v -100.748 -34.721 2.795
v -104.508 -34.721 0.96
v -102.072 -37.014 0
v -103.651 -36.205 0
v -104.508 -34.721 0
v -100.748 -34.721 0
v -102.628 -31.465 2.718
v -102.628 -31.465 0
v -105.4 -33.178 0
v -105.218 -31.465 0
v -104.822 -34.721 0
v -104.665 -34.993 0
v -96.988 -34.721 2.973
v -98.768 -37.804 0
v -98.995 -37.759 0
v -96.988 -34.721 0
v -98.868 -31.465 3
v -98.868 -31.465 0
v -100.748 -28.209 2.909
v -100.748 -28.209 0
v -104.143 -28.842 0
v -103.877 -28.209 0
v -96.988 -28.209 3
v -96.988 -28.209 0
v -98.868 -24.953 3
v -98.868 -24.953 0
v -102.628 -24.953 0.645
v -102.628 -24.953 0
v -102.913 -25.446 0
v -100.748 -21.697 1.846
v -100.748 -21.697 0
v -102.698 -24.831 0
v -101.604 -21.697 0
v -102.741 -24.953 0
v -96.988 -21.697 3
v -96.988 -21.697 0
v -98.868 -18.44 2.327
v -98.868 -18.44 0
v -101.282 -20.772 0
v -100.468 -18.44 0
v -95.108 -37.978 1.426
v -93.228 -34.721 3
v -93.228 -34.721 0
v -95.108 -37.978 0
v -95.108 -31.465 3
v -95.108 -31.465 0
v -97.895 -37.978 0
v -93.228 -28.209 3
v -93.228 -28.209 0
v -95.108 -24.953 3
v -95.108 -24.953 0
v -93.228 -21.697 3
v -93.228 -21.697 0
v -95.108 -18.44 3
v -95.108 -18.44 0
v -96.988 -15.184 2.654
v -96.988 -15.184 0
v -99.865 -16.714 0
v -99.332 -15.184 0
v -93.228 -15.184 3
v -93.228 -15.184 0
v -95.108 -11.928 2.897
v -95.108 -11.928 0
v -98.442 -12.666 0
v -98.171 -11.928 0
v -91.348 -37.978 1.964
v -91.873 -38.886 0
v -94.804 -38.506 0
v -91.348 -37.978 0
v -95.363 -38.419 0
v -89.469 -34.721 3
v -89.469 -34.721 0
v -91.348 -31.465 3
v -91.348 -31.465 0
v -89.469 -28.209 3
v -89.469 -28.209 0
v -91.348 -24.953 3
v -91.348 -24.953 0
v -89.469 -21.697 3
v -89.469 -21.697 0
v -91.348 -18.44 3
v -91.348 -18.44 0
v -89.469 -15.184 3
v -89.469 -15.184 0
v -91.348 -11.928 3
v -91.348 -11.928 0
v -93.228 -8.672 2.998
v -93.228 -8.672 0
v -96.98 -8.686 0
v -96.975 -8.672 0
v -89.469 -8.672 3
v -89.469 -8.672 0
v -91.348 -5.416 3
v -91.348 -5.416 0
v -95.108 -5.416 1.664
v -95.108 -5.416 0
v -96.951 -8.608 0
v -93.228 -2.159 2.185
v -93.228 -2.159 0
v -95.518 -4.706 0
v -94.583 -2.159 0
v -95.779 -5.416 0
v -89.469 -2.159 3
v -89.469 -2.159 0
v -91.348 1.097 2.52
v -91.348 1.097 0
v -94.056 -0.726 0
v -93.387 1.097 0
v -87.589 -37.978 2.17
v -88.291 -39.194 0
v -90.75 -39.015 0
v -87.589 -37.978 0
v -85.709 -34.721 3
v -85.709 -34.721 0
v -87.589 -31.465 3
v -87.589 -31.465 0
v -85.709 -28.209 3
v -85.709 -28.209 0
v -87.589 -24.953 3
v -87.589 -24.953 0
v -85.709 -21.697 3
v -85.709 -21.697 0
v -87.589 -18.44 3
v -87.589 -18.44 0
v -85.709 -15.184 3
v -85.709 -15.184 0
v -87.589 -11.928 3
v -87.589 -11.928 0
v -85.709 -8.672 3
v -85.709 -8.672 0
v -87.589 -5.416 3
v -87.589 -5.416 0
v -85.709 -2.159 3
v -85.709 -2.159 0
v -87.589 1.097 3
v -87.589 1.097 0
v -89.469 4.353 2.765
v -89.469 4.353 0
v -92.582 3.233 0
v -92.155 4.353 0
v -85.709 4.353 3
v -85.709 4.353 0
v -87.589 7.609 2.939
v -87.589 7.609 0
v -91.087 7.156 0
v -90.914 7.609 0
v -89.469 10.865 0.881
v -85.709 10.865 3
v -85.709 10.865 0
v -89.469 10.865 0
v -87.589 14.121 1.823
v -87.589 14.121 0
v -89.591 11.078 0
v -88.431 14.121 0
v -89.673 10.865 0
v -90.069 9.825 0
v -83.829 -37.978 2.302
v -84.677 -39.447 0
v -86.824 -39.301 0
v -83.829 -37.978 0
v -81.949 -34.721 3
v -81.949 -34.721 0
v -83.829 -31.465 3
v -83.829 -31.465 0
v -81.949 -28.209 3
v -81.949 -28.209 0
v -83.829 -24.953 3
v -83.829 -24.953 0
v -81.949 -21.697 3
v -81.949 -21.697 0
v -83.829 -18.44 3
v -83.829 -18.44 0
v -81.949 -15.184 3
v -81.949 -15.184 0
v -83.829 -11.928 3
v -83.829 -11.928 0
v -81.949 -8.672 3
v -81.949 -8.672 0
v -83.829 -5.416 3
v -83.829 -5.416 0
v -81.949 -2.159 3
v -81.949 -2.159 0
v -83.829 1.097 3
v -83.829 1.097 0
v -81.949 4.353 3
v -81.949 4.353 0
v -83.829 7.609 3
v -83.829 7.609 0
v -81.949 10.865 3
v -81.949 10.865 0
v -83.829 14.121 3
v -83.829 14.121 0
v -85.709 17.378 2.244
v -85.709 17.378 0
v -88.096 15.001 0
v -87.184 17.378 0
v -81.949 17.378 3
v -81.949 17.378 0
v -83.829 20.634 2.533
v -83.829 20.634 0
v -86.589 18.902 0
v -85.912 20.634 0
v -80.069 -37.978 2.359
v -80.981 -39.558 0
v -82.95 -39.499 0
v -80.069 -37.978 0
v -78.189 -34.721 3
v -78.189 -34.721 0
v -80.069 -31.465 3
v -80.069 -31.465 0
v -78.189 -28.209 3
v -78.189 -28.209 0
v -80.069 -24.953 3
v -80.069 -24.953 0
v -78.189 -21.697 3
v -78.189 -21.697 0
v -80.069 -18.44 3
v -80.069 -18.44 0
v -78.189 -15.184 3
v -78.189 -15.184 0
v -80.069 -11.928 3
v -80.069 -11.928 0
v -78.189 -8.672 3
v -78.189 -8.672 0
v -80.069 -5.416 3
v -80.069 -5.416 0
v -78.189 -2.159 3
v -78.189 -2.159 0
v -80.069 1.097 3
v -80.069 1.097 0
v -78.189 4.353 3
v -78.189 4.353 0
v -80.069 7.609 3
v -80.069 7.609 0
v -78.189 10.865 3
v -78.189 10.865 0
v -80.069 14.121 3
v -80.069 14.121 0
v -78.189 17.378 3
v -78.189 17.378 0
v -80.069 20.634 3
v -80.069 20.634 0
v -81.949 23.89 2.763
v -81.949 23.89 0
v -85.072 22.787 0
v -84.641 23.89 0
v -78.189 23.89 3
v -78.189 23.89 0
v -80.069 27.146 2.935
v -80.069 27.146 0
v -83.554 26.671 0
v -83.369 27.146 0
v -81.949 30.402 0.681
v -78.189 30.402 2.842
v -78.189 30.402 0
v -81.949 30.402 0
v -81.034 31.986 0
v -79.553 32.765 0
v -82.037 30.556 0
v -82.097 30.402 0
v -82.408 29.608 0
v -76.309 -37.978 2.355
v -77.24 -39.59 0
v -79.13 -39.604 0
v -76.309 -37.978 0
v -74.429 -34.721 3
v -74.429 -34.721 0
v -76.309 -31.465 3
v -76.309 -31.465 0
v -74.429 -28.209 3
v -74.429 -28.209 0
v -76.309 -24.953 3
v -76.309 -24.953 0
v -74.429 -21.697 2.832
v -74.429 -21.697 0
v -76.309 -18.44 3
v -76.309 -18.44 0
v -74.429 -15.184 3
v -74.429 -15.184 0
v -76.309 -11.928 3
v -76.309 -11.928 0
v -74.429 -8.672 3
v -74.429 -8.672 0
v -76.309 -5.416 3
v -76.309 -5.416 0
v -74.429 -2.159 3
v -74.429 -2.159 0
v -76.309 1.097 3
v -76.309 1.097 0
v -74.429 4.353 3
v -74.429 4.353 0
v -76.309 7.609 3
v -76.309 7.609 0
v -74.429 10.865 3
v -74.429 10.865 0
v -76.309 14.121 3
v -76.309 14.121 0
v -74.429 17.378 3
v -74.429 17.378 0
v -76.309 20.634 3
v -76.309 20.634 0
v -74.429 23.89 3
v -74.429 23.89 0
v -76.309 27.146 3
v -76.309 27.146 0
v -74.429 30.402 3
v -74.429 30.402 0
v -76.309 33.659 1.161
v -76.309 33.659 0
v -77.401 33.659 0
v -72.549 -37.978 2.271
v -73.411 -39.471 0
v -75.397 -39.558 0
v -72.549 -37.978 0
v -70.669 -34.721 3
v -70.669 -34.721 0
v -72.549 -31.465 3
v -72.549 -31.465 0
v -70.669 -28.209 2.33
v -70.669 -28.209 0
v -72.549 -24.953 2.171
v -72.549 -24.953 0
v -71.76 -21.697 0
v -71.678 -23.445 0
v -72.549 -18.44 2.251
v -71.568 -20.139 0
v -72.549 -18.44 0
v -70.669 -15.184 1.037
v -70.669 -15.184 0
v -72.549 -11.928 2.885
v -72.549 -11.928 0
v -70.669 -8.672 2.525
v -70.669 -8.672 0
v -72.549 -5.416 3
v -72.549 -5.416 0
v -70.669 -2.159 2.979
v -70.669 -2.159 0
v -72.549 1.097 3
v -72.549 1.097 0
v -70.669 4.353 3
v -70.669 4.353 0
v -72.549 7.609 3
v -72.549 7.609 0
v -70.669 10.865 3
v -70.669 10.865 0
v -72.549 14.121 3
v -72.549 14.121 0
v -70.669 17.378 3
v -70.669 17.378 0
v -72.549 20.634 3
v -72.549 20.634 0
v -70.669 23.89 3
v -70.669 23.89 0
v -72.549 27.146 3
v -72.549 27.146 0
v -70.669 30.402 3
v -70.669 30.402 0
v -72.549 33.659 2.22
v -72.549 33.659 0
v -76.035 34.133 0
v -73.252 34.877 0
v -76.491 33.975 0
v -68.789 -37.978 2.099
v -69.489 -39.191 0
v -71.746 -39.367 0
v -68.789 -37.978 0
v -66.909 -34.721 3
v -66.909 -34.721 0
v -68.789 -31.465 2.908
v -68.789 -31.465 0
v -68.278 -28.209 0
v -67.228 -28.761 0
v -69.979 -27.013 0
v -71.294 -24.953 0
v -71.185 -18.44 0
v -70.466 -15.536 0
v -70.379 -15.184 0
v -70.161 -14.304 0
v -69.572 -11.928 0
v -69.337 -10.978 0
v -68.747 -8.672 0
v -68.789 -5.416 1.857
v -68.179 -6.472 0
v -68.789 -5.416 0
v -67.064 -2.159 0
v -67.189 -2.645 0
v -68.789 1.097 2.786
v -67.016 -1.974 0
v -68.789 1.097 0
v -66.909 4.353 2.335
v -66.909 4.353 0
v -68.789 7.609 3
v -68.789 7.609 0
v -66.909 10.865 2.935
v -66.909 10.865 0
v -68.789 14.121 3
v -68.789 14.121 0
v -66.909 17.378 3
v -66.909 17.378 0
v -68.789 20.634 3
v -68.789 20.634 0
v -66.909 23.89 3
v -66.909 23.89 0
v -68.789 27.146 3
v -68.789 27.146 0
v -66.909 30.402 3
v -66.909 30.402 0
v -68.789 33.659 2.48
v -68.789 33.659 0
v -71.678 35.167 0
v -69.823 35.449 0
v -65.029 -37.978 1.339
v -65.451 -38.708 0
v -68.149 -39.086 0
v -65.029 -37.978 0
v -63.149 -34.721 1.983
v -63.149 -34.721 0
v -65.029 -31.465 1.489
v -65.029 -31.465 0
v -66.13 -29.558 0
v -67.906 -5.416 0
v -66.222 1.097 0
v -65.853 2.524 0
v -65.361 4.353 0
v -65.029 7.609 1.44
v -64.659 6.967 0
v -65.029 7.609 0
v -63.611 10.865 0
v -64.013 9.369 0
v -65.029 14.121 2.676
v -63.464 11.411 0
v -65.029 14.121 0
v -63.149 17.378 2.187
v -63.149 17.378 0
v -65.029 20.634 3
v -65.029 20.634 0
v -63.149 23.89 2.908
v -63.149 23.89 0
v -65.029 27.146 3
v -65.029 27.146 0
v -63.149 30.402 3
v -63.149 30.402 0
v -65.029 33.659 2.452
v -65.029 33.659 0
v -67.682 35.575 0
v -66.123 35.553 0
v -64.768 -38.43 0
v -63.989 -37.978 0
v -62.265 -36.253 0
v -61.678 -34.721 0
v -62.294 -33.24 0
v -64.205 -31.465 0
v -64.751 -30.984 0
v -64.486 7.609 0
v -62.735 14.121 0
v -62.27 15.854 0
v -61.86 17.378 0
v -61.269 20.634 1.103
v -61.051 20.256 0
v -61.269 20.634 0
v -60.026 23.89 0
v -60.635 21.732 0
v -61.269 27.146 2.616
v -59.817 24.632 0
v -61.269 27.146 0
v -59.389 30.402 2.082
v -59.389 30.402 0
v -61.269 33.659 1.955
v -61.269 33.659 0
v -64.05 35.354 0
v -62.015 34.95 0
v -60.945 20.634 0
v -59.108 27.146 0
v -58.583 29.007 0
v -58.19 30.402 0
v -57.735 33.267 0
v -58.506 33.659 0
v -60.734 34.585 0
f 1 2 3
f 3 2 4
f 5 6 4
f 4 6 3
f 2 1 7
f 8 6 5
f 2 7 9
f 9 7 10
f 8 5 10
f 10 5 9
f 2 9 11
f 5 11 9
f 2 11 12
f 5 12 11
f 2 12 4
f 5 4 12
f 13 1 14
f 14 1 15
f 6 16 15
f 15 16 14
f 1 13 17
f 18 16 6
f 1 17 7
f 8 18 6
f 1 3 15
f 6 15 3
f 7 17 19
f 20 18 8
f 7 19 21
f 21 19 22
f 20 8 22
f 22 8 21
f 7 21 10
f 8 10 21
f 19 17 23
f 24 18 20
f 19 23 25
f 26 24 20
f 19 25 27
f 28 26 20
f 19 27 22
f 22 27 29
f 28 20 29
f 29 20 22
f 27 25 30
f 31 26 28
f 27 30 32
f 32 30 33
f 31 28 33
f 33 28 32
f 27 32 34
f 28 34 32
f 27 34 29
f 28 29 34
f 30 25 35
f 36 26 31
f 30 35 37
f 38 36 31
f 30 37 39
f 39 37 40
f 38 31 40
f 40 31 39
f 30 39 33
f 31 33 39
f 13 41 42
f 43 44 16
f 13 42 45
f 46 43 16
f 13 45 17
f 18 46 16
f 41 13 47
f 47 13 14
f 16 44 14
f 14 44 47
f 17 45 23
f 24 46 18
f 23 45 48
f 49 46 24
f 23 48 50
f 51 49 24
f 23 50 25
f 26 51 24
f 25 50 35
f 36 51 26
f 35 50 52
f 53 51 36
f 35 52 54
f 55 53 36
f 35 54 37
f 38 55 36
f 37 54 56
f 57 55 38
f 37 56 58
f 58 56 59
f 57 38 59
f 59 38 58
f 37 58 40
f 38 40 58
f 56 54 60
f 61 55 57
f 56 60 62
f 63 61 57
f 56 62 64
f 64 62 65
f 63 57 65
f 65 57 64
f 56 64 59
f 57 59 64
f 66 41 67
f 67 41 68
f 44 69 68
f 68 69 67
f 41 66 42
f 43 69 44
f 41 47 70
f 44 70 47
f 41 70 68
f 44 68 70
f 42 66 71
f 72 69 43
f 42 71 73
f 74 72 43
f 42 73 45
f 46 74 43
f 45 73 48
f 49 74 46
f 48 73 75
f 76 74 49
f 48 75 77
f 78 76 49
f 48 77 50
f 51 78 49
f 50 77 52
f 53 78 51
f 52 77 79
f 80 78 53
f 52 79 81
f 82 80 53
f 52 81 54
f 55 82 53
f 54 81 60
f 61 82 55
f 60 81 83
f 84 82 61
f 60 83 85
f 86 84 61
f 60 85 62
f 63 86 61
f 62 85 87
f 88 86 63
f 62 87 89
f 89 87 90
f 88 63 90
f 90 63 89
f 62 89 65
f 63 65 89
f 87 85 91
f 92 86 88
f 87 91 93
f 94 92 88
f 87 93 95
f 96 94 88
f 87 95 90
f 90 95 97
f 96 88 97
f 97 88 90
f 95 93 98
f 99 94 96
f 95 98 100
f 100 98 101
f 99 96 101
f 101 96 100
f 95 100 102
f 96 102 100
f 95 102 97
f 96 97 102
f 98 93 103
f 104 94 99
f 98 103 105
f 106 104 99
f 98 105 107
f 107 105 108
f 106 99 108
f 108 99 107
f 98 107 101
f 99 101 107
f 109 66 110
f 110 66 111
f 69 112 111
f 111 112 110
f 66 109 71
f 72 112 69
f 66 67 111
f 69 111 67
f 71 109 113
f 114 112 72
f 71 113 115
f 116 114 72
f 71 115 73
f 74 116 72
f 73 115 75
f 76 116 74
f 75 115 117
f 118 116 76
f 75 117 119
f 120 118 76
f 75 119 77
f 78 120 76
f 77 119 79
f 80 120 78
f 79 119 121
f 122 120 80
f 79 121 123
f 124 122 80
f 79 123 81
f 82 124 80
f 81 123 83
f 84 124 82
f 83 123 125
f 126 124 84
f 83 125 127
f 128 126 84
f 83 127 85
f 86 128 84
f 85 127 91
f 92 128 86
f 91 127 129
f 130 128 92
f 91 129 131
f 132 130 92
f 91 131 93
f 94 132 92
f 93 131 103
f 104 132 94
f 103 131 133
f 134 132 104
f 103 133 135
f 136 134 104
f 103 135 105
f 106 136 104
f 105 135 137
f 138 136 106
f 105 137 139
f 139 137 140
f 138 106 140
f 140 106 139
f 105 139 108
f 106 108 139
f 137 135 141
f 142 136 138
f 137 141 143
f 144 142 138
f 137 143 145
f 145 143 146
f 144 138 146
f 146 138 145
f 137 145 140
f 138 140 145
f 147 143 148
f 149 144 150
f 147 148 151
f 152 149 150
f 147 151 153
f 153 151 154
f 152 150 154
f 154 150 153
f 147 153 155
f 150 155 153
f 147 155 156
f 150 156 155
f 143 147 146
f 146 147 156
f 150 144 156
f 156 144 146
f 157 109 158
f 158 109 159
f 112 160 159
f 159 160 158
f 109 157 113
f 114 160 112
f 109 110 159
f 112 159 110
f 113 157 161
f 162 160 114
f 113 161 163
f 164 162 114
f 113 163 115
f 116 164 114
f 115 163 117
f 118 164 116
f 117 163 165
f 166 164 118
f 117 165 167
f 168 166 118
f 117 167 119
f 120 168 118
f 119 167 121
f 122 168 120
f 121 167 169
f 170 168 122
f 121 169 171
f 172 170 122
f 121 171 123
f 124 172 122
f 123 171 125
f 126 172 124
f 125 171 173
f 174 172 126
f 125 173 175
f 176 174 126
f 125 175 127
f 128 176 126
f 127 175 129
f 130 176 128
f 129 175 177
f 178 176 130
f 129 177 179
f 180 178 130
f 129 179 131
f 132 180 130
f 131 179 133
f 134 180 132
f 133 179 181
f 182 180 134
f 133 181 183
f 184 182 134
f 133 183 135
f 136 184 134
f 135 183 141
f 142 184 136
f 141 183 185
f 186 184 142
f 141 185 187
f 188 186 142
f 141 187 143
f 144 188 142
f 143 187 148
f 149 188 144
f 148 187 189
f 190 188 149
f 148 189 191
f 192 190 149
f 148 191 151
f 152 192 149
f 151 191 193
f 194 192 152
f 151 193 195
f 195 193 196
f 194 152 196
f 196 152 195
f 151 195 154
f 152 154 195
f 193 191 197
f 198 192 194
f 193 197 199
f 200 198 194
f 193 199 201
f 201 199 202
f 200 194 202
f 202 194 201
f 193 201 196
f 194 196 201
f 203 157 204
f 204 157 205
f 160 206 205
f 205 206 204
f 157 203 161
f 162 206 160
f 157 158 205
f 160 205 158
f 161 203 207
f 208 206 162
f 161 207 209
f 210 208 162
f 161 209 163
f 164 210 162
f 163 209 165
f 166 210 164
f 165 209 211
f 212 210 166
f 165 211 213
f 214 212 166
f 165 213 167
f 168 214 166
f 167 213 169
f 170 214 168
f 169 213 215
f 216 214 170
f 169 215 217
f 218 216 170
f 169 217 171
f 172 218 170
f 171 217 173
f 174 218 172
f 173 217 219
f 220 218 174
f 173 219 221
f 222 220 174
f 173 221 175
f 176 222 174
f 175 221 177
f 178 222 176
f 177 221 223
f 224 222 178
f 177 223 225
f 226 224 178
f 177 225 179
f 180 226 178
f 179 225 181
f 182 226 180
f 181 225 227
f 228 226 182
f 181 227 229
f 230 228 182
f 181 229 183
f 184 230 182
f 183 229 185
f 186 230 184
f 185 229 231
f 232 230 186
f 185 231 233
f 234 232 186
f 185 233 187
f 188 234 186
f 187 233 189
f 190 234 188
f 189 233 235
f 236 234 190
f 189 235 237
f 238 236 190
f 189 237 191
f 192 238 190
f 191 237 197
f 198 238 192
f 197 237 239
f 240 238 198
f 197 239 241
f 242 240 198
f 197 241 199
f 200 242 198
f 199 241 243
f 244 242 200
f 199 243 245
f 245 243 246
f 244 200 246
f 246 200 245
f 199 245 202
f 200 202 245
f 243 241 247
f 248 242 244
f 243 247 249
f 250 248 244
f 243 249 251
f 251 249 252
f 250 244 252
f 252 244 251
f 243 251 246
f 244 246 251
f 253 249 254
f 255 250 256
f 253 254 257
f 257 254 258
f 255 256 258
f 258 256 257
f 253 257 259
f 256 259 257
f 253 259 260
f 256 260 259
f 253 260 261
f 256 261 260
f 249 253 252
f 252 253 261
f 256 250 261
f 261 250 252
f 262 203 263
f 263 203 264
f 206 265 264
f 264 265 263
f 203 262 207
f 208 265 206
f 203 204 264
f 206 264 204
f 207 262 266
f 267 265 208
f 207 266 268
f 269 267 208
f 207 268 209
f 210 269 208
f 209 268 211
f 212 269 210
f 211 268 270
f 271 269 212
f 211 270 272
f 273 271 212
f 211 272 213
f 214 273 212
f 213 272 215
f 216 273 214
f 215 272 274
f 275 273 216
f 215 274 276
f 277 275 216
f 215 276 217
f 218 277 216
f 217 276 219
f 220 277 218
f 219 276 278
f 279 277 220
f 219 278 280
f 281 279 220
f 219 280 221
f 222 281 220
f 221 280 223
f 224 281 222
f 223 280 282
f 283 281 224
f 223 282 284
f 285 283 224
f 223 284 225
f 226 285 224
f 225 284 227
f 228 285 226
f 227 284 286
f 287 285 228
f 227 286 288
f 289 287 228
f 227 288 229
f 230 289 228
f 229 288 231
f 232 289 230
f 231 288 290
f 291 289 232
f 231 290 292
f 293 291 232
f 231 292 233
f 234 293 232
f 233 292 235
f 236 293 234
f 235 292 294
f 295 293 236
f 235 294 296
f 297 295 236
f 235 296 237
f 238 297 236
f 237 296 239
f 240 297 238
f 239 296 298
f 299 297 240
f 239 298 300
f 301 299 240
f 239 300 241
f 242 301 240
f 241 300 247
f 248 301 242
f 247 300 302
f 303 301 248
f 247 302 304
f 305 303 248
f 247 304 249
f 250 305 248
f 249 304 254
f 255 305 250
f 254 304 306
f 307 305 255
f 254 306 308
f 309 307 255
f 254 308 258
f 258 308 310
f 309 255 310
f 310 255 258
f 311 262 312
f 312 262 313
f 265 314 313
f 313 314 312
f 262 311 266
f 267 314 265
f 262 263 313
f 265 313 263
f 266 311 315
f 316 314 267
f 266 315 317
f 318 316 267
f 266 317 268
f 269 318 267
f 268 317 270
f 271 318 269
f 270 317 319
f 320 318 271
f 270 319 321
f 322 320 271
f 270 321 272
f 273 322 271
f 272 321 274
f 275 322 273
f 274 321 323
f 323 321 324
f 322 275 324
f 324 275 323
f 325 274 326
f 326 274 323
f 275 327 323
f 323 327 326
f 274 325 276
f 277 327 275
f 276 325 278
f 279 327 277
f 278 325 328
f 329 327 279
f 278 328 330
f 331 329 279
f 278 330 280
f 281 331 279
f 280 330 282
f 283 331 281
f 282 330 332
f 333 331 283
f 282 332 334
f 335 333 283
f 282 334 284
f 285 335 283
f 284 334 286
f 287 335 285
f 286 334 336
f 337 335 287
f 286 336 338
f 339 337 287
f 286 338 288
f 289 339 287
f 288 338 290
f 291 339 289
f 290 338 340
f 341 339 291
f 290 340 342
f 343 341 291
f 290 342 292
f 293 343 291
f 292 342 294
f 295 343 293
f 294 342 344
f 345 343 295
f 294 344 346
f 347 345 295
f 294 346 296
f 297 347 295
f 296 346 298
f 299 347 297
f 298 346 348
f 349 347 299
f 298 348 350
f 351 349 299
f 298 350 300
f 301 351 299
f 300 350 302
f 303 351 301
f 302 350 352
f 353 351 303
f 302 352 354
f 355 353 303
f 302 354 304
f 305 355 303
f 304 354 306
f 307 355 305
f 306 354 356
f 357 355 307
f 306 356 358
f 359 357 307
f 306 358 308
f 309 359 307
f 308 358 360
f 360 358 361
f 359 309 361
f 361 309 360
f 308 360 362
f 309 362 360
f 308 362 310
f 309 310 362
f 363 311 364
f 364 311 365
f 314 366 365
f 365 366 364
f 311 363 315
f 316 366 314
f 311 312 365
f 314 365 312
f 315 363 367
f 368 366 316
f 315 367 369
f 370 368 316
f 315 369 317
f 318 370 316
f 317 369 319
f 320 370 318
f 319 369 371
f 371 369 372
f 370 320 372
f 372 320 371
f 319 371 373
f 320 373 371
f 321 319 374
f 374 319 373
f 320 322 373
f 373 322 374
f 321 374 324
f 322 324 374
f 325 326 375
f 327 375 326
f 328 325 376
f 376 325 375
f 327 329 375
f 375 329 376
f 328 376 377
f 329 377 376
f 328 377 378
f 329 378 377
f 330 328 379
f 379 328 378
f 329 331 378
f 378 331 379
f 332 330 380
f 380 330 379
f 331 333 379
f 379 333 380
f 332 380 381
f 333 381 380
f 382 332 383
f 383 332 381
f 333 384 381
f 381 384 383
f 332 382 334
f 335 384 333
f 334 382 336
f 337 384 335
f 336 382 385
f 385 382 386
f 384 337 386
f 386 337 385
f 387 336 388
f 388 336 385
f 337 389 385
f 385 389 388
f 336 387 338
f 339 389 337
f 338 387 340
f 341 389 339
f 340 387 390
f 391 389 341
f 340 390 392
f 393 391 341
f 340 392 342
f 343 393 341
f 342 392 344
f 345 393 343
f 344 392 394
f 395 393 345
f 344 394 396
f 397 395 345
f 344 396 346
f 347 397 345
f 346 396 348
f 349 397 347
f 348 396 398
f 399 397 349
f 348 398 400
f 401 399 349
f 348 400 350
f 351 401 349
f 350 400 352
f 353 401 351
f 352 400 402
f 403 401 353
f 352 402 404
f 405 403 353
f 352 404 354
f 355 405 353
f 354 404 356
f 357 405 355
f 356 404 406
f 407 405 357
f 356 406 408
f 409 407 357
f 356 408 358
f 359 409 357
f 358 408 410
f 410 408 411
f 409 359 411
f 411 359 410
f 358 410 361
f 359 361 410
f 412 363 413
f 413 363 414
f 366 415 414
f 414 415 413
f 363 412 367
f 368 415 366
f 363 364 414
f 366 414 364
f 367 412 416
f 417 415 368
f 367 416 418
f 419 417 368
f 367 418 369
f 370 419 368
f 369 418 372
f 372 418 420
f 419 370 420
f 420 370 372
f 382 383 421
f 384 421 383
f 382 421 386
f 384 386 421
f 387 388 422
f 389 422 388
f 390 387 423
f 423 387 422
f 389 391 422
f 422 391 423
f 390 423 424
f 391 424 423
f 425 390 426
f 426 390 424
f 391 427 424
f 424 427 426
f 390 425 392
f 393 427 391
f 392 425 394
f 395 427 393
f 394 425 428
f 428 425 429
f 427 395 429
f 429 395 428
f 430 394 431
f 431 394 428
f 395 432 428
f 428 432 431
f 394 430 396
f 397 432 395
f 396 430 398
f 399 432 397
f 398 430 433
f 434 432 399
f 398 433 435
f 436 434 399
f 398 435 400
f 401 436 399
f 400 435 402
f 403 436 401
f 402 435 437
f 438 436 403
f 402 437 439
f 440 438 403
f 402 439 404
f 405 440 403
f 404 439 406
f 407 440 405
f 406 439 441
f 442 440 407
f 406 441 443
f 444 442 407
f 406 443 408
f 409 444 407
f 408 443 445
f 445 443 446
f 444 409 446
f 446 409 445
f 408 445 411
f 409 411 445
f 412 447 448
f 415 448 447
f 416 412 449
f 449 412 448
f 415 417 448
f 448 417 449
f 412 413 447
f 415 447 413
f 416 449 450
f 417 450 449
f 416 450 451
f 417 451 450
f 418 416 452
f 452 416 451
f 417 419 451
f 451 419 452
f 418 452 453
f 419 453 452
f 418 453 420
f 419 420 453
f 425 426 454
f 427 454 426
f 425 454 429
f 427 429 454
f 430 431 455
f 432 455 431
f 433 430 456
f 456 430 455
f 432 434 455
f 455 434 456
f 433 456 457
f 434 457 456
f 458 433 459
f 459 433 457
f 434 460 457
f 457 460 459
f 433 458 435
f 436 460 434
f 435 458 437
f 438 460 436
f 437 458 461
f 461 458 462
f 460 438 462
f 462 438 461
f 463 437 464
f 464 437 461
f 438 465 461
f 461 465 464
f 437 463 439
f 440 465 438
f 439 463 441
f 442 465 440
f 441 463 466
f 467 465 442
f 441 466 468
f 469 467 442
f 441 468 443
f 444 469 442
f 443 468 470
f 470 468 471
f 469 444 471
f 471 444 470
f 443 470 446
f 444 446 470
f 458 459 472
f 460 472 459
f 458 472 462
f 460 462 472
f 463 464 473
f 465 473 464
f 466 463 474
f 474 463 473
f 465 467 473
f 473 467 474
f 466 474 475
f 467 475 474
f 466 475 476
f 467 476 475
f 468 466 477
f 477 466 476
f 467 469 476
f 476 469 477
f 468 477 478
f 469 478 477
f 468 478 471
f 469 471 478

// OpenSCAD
center_inflated_handlenset_2 = [-81.56742,-2.01432];
size_inflated_handlenset_2 = [47.66421,75.17897];
color_inflated_handlenset_2 = [1.00000,1.00000,0.00000];

module inflated_handlenset_2() {
  color(color_inflated_handlenset_2) polyhedron(points=[[-20.50435,-34.99940,0.00000],[-22.94080,-32.70708,0.95978],[-19.18088,-32.70708,2.79533],[-22.08396,-34.19117,0.00000],[-19.18088,-32.70708,-0.00000],[-22.94080,-32.70708,-0.00000],[-21.06084,-29.45089,2.71815],[-21.06084,-29.45089,-0.00000],[-23.83210,-31.16330,0.00000],[-23.65095,-29.45089,0.00000],[-23.25449,-32.70708,0.00000],[-23.09790,-32.97917,0.00000],[-17.20067,-35.78964,0.00000],[-15.42095,-32.70708,2.97272],[-17.42718,-35.74458,0.00000],[-15.42095,-32.70708,-0.00000],[-17.30092,-29.45089,3.00000],[-17.30092,-29.45089,-0.00000],[-19.18088,-26.19470,2.90929],[-19.18088,-26.19470,-0.00000],[-22.57530,-26.82777,0.00000],[-22.30999,-26.19470,0.00000],[-15.42095,-26.19470,3.00000],[-15.42095,-26.19470,-0.00000],[-17.30092,-22.93851,3.00000],[-17.30092,-22.93851,-0.00000],[-21.06084,-22.93851,0.64451],[-21.06084,-22.93851,-0.00000],[-21.34574,-23.43197,0.00000],[-19.18088,-19.68231,1.84604],[-19.18088,-19.68231,-0.00000],[-21.13106,-22.81688,0.00000],[-20.03704,-19.68231,0.00000],[-21.17352,-22.93851,0.00000],[-15.42095,-19.68231,3.00000],[-15.42095,-19.68231,-0.00000],[-17.30092,-16.42612,2.32710],[-17.30092,-16.42612,-0.00000],[-19.71448,-18.75810,0.00000],[-18.90057,-16.42612,0.00000],[-11.66103,-32.70708,3.00000],[-13.54099,-35.96327,1.42557],[-13.54099,-35.96327,-0.00000],[-11.66103,-32.70708,-0.00000],[-13.54099,-29.45089,3.00000],[-13.54099,-29.45089,-0.00000],[-16.32773,-35.96327,0.00000],[-11.66103,-26.19470,3.00000],[-11.66103,-26.19470,-0.00000],[-13.54099,-22.93851,3.00000],[-13.54099,-22.93851,-0.00000],[-11.66103,-19.68231,3.00000],[-11.66103,-19.68231,-0.00000],[-13.54099,-16.42612,3.00000],[-13.54099,-16.42612,-0.00000],[-15.42095,-13.16993,2.65351],[-15.42095,-13.16993,-0.00000],[-18.29789,-14.69932,0.00000],[-17.76410,-13.16993,0.00000],[-11.66103,-13.16993,3.00000],[-11.66103,-13.16993,-0.00000],[-13.54099,-9.91374,2.89666],[-13.54099,-9.91374,-0.00000],[-16.87473,-10.65192,0.00000],[-16.60357,-9.91374,0.00000],[-10.30547,-36.87156,0.00000],[-9.78106,-35.96327,1.96432],[-13.23616,-36.49125,0.00000],[-9.78106,-35.96327,-0.00000],[-13.79606,-36.40506,0.00000],[-7.90110,-32.70708,3.00000],[-7.90110,-32.70708,-0.00000],[-9.78106,-29.45089,3.00000],[-9.78106,-29.45089,-0.00000],[-7.90110,-26.19470,3.00000],[-7.90110,-26.19470,-0.00000],[-9.78106,-22.93851,3.00000],[-9.78106,-22.93851,-0.00000],[-7.90110,-19.68231,3.00000],[-7.90110,-19.68231,-0.00000],[-9.78106,-16.42612,3.00000],[-9.78106,-16.42612,-0.00000],[-7.90110,-13.16993,3.00000],[-7.90110,-13.16993,-0.00000],[-9.78106,-9.91374,3.00000],[-9.78106,-9.91374,-0.00000],[-11.66103,-6.65755,2.99821],[-11.66103,-6.65755,-0.00000],[-15.41272,-6.67181,0.00000],[-15.40748,-6.65755,0.00000],[-7.90110,-6.65755,3.00000],[-7.90110,-6.65755,-0.00000],[-9.78106,-3.40136,3.00000],[-9.78106,-3.40136,-0.00000],[-13.54099,-3.40136,1.66450],[-13.54099,-3.40136,-0.00000],[-15.38393,-6.59342,0.00000],[-11.66103,-0.14517,2.18521],[-11.66103,-0.14517,-0.00000],[-13.95071,-2.69169,0.00000],[-13.01530,-0.14517,0.00000],[-14.21139,-3.40136,0.00000],[-7.90110,-0.14517,3.00000],[-7.90110,-0.14517,-0.00000],[-9.78106,3.11102,2.51968],[-9.78106,3.11102,-0.00000],[-12.48871,1.28842,0.00000],[-11.81921,3.11102,0.00000],[-6.72352,-37.17983,0.00000],[-6.02114,-35.96327,2.16988],[-9.18211,-37.00069,0.00000],[-6.02114,-35.96327,-0.00000],[-4.14118,-32.70708,3.00000],[-4.14118,-32.70708,-0.00000],[-6.02114,-29.45089,3.00000],[-6.02114,-29.45089,-0.00000],[-4.14118,-26.19470,3.00000],[-4.14118,-26.19470,-0.00000],[-6.02114,-22.93851,3.00000],[-6.02114,-22.93851,-0.00000],[-4.14118,-19.68231,3.00000],[-4.14118,-19.68231,-0.00000],[-6.02114,-16.42612,3.00000],[-6.02114,-16.42612,-0.00000],[-4.14118,-13.16993,3.00000],[-4.14118,-13.16993,-0.00000],[-6.02114,-9.91374,3.00000],[-6.02114,-9.91374,-0.00000],[-4.14118,-6.65755,3.00000],[-4.14118,-6.65755,-0.00000],[-6.02114,-3.40136,3.00000],[-6.02114,-3.40136,-0.00000],[-4.14118,-0.14517,3.00000],[-4.14118,-0.14517,-0.00000],[-6.02114,3.11102,3.00000],[-6.02114,3.11102,-0.00000],[-7.90110,6.36722,2.76541],[-7.90110,6.36722,-0.00000],[-11.01454,5.24746,0.00000],[-10.58768,6.36722,0.00000],[-4.14118,6.36722,3.00000],[-4.14118,6.36722,-0.00000],[-6.02114,9.62341,2.93912],[-6.02114,9.62341,-0.00000],[-9.51927,9.16996,0.00000],[-9.34642,9.62341,0.00000],[-4.14118,12.87960,3.00000],[-7.90110,12.87960,0.88127],[-7.90110,12.87960,-0.00000],[-4.14118,12.87960,-0.00000],[-6.02114,16.13579,1.82341],[-6.02114,16.13579,-0.00000],[-8.02400,13.09247,0.00000],[-6.86388,16.13579,0.00000],[-8.10515,12.87960,0.00000],[-8.50170,11.83933,0.00000],[-3.10967,-37.43284,0.00000],[-2.26121,-35.96327,2.30165],[-5.25706,-37.28669,0.00000],[-2.26121,-35.96327,-0.00000],[-0.38125,-32.70708,3.00000],[-0.38125,-32.70708,-0.00000],[-2.26121,-29.45089,3.00000],[-2.26121,-29.45089,-0.00000],[-0.38125,-26.19470,3.00000],[-0.38125,-26.19470,-0.00000],[-2.26121,-22.93851,3.00000],[-2.26121,-22.93851,-0.00000],[-0.38125,-19.68231,3.00000],[-0.38125,-19.68231,-0.00000],[-2.26121,-16.42612,3.00000],[-2.26121,-16.42612,-0.00000],[-0.38125,-13.16993,3.00000],[-0.38125,-13.16993,-0.00000],[-2.26121,-9.91374,3.00000],[-2.26121,-9.91374,-0.00000],[-0.38125,-6.65755,3.00000],[-0.38125,-6.65755,-0.00000],[-2.26121,-3.40136,3.00000],[-2.26121,-3.40136,-0.00000],[-0.38125,-0.14517,3.00000],[-0.38125,-0.14517,-0.00000],[-2.26121,3.11102,3.00000],[-2.26121,3.11102,-0.00000],[-0.38125,6.36722,3.00000],[-0.38125,6.36722,-0.00000],[-2.26121,9.62341,3.00000],[-2.26121,9.62341,-0.00000],[-0.38125,12.87960,3.00000],[-0.38125,12.87960,-0.00000],[-2.26121,16.13579,3.00000],[-2.26121,16.13579,-0.00000],[-4.14118,19.39198,2.24447],[-4.14118,19.39198,-0.00000],[-6.52873,17.01497,0.00000],[-5.61682,19.39198,0.00000],[-0.38125,19.39198,3.00000],[-0.38125,19.39198,-0.00000],[-2.26121,22.64817,2.53282],[-2.26121,22.64817,-0.00000],[-5.02137,20.91653,0.00000],[-4.34505,22.64817,0.00000],[0.58622,-37.54375,0.00000],[1.49871,-35.96327,2.35889],[-1.38284,-37.48466,0.00000],[1.49871,-35.96327,-0.00000],[3.37868,-32.70708,3.00000],[3.37868,-32.70708,-0.00000],[1.49871,-29.45089,3.00000],[1.49871,-29.45089,-0.00000],[3.37868,-26.19470,3.00000],[3.37868,-26.19470,-0.00000],[1.49871,-22.93851,3.00000],[1.49871,-22.93851,-0.00000],[3.37868,-19.68231,3.00000],[3.37868,-19.68231,-0.00000],[1.49871,-16.42612,3.00000],[1.49871,-16.42612,-0.00000],[3.37868,-13.16993,3.00000],[3.37868,-13.16993,-0.00000],[1.49871,-9.91374,3.00000],[1.49871,-9.91374,-0.00000],[3.37868,-6.65755,3.00000],[3.37868,-6.65755,-0.00000],[1.49871,-3.40136,3.00000],[1.49871,-3.40136,-0.00000],[3.37868,-0.14517,3.00000],[3.37868,-0.14517,-0.00000],[1.49871,3.11102,3.00000],[1.49871,3.11102,-0.00000],[3.37868,6.36722,3.00000],[3.37868,6.36722,-0.00000],[1.49871,9.62341,3.00000],[1.49871,9.62341,-0.00000],[3.37868,12.87960,3.00000],[3.37868,12.87960,-0.00000],[1.49871,16.13579,3.00000],[1.49871,16.13579,-0.00000],[3.37868,19.39198,3.00000],[3.37868,19.39198,-0.00000],[1.49871,22.64817,3.00000],[1.49871,22.64817,-0.00000],[-0.38125,25.90436,2.76283],[-0.38125,25.90436,-0.00000],[-3.50419,24.80107,0.00000],[-3.07327,25.90436,0.00000],[3.37868,25.90436,3.00000],[3.37868,25.90436,-0.00000],[1.49871,29.16055,2.93540],[1.49871,29.16055,-0.00000],[-1.98700,28.68560,0.00000],[-1.80150,29.16055,0.00000],[3.37868,32.41675,2.84242],[-0.38125,32.41675,0.68079],[-0.38125,32.41675,-0.00000],[3.37868,32.41675,-0.00000],[0.53304,34.00033,0.00000],[2.01450,34.77957,0.00000],[-0.46981,32.57014,0.00000],[-0.52972,32.41675,0.00000],[-0.84020,31.62182,0.00000],[4.32750,-37.57605,0.00000],[5.25864,-35.96327,2.35535],[2.43761,-37.58948,0.00000],[5.25864,-35.96327,-0.00000],[7.13860,-32.70708,3.00000],[7.13860,-32.70708,-0.00000],[5.25864,-29.45089,3.00000],[5.25864,-29.45089,-0.00000],[7.13860,-26.19470,3.00000],[7.13860,-26.19470,-0.00000],[5.25864,-22.93851,3.00000],[5.25864,-22.93851,-0.00000],[7.13860,-19.68231,2.83164],[7.13860,-19.68231,-0.00000],[5.25864,-16.42612,3.00000],[5.25864,-16.42612,-0.00000],[7.13860,-13.16993,3.00000],[7.13860,-13.16993,-0.00000],[5.25864,-9.91374,3.00000],[5.25864,-9.91374,-0.00000],[7.13860,-6.65755,3.00000],[7.13860,-6.65755,-0.00000],[5.25864,-3.40136,3.00000],[5.25864,-3.40136,-0.00000],[7.13860,-0.14517,3.00000],[7.13860,-0.14517,-0.00000],[5.25864,3.11102,3.00000],[5.25864,3.11102,-0.00000],[7.13860,6.36722,3.00000],[7.13860,6.36722,-0.00000],[5.25864,9.62341,3.00000],[5.25864,9.62341,-0.00000],[7.13860,12.87960,3.00000],[7.13860,12.87960,-0.00000],[5.25864,16.13579,3.00000],[5.25864,16.13579,-0.00000],[7.13860,19.39198,3.00000],[7.13860,19.39198,-0.00000],[5.25864,22.64817,3.00000],[5.25864,22.64817,-0.00000],[7.13860,25.90436,3.00000],[7.13860,25.90436,-0.00000],[5.25864,29.16055,3.00000],[5.25864,29.16055,-0.00000],[7.13860,32.41675,3.00000],[7.13860,32.41675,-0.00000],[5.25864,35.67294,1.16078],[5.25864,35.67294,-0.00000],[4.16627,35.67294,0.00000],[8.15630,-37.45676,0.00000],[9.01856,-35.96327,2.27131],[6.17085,-37.54327,0.00000],[9.01856,-35.96327,-0.00000],[10.89853,-32.70708,3.00000],[10.89853,-32.70708,-0.00000],[9.01856,-29.45089,3.00000],[9.01856,-29.45089,-0.00000],[10.89853,-26.19470,2.32976],[10.89853,-26.19470,-0.00000],[9.01856,-22.93851,2.17150],[9.01856,-22.93851,-0.00000],[9.80724,-19.68231,0.00000],[9.88919,-21.43053,0.00000],[9.99934,-18.12488,0.00000],[9.01856,-16.42612,2.25132],[9.01856,-16.42612,-0.00000],[10.89853,-13.16993,1.03721],[10.89853,-13.16993,-0.00000],[9.01856,-9.91374,2.88484],[9.01856,-9.91374,-0.00000],[10.89853,-6.65755,2.52485],[10.89853,-6.65755,-0.00000],[9.01856,-3.40136,3.00000],[9.01856,-3.40136,-0.00000],[10.89853,-0.14517,2.97906],[10.89853,-0.14517,-0.00000],[9.01856,3.11102,3.00000],[9.01856,3.11102,-0.00000],[10.89853,6.36722,3.00000],[10.89853,6.36722,-0.00000],[9.01856,9.62341,3.00000],[9.01856,9.62341,-0.00000],[10.89853,12.87960,3.00000],[10.89853,12.87960,-0.00000],[9.01856,16.13579,3.00000],[9.01856,16.13579,-0.00000],[10.89853,19.39198,3.00000],[10.89853,19.39198,-0.00000],[9.01856,22.64817,3.00000],[9.01856,22.64817,-0.00000],[10.89853,25.90436,3.00000],[10.89853,25.90436,-0.00000],[9.01856,29.16055,3.00000],[9.01856,29.16055,-0.00000],[10.89853,32.41675,3.00000],[10.89853,32.41675,-0.00000],[9.01856,35.67294,2.22042],[9.01856,35.67294,-0.00000],[5.53274,36.14769,0.00000],[8.31505,36.89145,0.00000],[5.07613,35.98905,0.00000],[12.07818,-37.17625,0.00000],[12.77849,-35.96327,2.09941],[9.82100,-37.35312,0.00000],[12.77849,-35.96327,-0.00000],[14.65845,-32.70708,3.00000],[14.65845,-32.70708,-0.00000],[12.77849,-29.45089,2.90822],[12.77849,-29.45089,-0.00000],[13.28949,-26.19470,0.00000],[14.33964,-26.74690,0.00000],[11.58885,-24.99902,0.00000],[10.27349,-22.93851,0.00000],[10.38259,-16.42612,0.00000],[11.10166,-13.52177,0.00000],[11.18877,-13.16993,0.00000],[11.40669,-12.28977,0.00000],[11.99496,-9.91374,0.00000],[12.23012,-8.96393,0.00000],[12.81999,-6.65755,0.00000],[13.38864,-4.45816,0.00000],[12.77849,-3.40136,1.85685],[12.77849,-3.40136,-0.00000],[14.50375,-0.14517,0.00000],[14.37828,-0.63043,0.00000],[14.55160,0.03991,0.00000],[12.77849,3.11102,2.78568],[12.77849,3.11102,-0.00000],[14.65845,6.36722,2.33498],[14.65845,6.36722,-0.00000],[12.77849,9.62341,3.00000],[12.77849,9.62341,-0.00000],[14.65845,12.87960,2.93510],[14.65845,12.87960,-0.00000],[12.77849,16.13579,3.00000],[12.77849,16.13579,-0.00000],[14.65845,19.39198,3.00000],[14.65845,19.39198,-0.00000],[12.77849,22.64817,3.00000],[12.77849,22.64817,-0.00000],[14.65845,25.90436,3.00000],[14.65845,25.90436,-0.00000],[12.77849,29.16055,3.00000],[12.77849,29.16055,-0.00000],[14.65845,32.41675,3.00000],[14.65845,32.41675,-0.00000],[12.77849,35.67294,2.48033],[12.77849,35.67294,-0.00000],[9.88956,37.18155,0.00000],[11.74460,37.46369,0.00000],[16.11665,-36.69379,0.00000],[16.53842,-35.96327,1.33875],[13.41818,-37.07125,0.00000],[16.53842,-35.96327,-0.00000],[18.41838,-32.70708,1.98300],[18.41838,-32.70708,-0.00000],[16.53842,-29.45089,1.48949],[16.53842,-29.45089,-0.00000],[15.43744,-27.54394,0.00000],[13.66187,-3.40136,0.00000],[15.34563,3.11102,0.00000],[15.71456,4.53798,0.00000],[16.20600,6.36722,0.00000],[16.90886,8.98177,0.00000],[16.53842,9.62341,1.43992],[16.53842,9.62341,-0.00000],[17.95670,12.87960,0.00000],[17.55443,11.38319,0.00000],[18.10337,13.42520,0.00000],[16.53842,16.13579,2.67592],[16.53842,16.13579,-0.00000],[18.41838,19.39198,2.18672],[18.41838,19.39198,-0.00000],[16.53842,22.64817,3.00000],[16.53842,22.64817,-0.00000],[18.41838,25.90436,2.90828],[18.41838,25.90436,-0.00000],[16.53842,29.16055,3.00000],[16.53842,29.16055,-0.00000],[18.41838,32.41675,3.00000],[18.41838,32.41675,-0.00000],[16.53842,35.67294,2.45189],[16.53842,35.67294,-0.00000],[13.88501,37.58948,0.00000],[15.44446,37.56772,0.00000],[17.57839,-35.96327,0.00000],[16.79935,-36.41523,0.00000],[19.30245,-34.23833,0.00000],[19.88958,-32.70708,0.00000],[19.27390,-31.22526,0.00000],[17.36248,-29.45089,0.00000],[16.81634,-28.96951,0.00000],[17.08135,9.62341,0.00000],[18.83205,16.13579,0.00000],[19.29789,17.86863,0.00000],[19.70740,19.39198,0.00000],[20.51623,22.27077,0.00000],[20.29834,22.64817,1.10296],[20.29834,22.64817,-0.00000],[21.54107,25.90436,0.00000],[20.93245,23.74647,0.00000],[21.75020,26.64586,0.00000],[20.29834,29.16055,2.61551],[20.29834,29.16055,-0.00000],[22.17830,32.41675,2.08238],[22.17830,32.41675,-0.00000],[20.29834,35.67294,1.95505],[20.29834,35.67294,-0.00000],[17.51733,37.36847,0.00000],[19.55260,36.96459,0.00000],[20.62268,22.64817,0.00000],[22.45945,29.16055,0.00000],[22.98417,31.02095,0.00000],[23.37784,32.41675,0.00000],[23.83210,35.28121,0.00000],[23.06156,35.67294,0.00000],[20.83296,36.59893,0.00000]], faces=[[0,1,2],[3,1,0],[3,4,5],[0,4,3],[6,2,1],[5,4,7],[8,6,1],[9,6,8],[9,5,7],[8,5,9],[10,8,1],[8,10,5],[11,10,1],[10,11,5],[3,11,1],[11,3,5],[12,2,13],[14,2,12],[14,15,4],[12,15,14],[16,13,2],[4,15,17],[6,16,2],[4,17,7],[14,0,2],[0,14,4],[18,16,6],[7,17,19],[20,18,6],[21,18,20],[21,7,19],[20,7,21],[9,20,6],[20,9,7],[22,16,18],[19,17,23],[24,22,18],[19,23,25],[26,24,18],[19,25,27],[21,26,18],[28,26,21],[28,19,27],[21,19,28],[29,24,26],[27,25,30],[31,29,26],[32,29,31],[32,27,30],[31,27,32],[33,31,26],[31,33,27],[28,33,26],[33,28,27],[34,24,29],[30,25,35],[36,34,29],[30,35,37],[38,36,29],[39,36,38],[39,30,37],[38,30,39],[32,38,29],[38,32,30],[40,41,13],[15,42,43],[44,40,13],[15,43,45],[16,44,13],[15,45,17],[46,13,41],[12,13,46],[12,42,15],[46,42,12],[22,44,16],[17,45,23],[47,44,22],[23,45,48],[49,47,22],[23,48,50],[24,49,22],[23,50,25],[34,49,24],[25,50,35],[51,49,34],[35,50,52],[53,51,34],[35,52,54],[36,53,34],[35,54,37],[55,53,36],[37,54,56],[57,55,36],[58,55,57],[58,37,56],[57,37,58],[39,57,36],[57,39,37],[59,53,55],[56,54,60],[61,59,55],[56,60,62],[63,61,55],[64,61,63],[64,56,62],[63,56,64],[58,63,55],[63,58,56],[65,41,66],[67,41,65],[67,68,42],[65,68,67],[40,66,41],[42,68,43],[69,46,41],[46,69,42],[67,69,41],[69,67,42],[70,66,40],[43,68,71],[72,70,40],[43,71,73],[44,72,40],[43,73,45],[47,72,44],[45,73,48],[74,72,47],[48,73,75],[76,74,47],[48,75,77],[49,76,47],[48,77,50],[51,76,49],[50,77,52],[78,76,51],[52,77,79],[80,78,51],[52,79,81],[53,80,51],[52,81,54],[59,80,53],[54,81,60],[82,80,59],[60,81,83],[84,82,59],[60,83,85],[61,84,59],[60,85,62],[86,84,61],[62,85,87],[88,86,61],[89,86,88],[89,62,87],[88,62,89],[64,88,61],[88,64,62],[90,84,86],[87,85,91],[92,90,86],[87,91,93],[94,92,86],[87,93,95],[89,94,86],[96,94,89],[96,87,95],[89,87,96],[97,92,94],[95,93,98],[99,97,94],[100,97,99],[100,95,98],[99,95,100],[101,99,94],[99,101,95],[96,101,94],[101,96,95],[102,92,97],[98,93,103],[104,102,97],[98,103,105],[106,104,97],[107,104,106],[107,98,105],[106,98,107],[100,106,97],[106,100,98],[108,66,109],[110,66,108],[110,111,68],[108,111,110],[70,109,66],[68,111,71],[110,65,66],[65,110,68],[112,109,70],[71,111,113],[114,112,70],[71,113,115],[72,114,70],[71,115,73],[74,114,72],[73,115,75],[116,114,74],[75,115,117],[118,116,74],[75,117,119],[76,118,74],[75,119,77],[78,118,76],[77,119,79],[120,118,78],[79,119,121],[122,120,78],[79,121,123],[80,122,78],[79,123,81],[82,122,80],[81,123,83],[124,122,82],[83,123,125],[126,124,82],[83,125,127],[84,126,82],[83,127,85],[90,126,84],[85,127,91],[128,126,90],[91,127,129],[130,128,90],[91,129,131],[92,130,90],[91,131,93],[102,130,92],[93,131,103],[132,130,102],[103,131,133],[134,132,102],[103,133,135],[104,134,102],[103,135,105],[136,134,104],[105,135,137],[138,136,104],[139,136,138],[139,105,137],[138,105,139],[107,138,104],[138,107,105],[140,134,136],[137,135,141],[142,140,136],[137,141,143],[144,142,136],[145,142,144],[145,137,143],[144,137,145],[139,144,136],[144,139,137],[146,142,147],[148,143,149],[150,146,147],[148,149,151],[152,150,147],[153,150,152],[153,148,151],[152,148,153],[154,152,147],[152,154,148],[155,154,147],[154,155,148],[145,147,142],[155,147,145],[155,143,148],[145,143,155],[156,109,157],[158,109,156],[158,159,111],[156,159,158],[112,157,109],[111,159,113],[158,108,109],[108,158,111],[160,157,112],[113,159,161],[162,160,112],[113,161,163],[114,162,112],[113,163,115],[116,162,114],[115,163,117],[164,162,116],[117,163,165],[166,164,116],[117,165,167],[118,166,116],[117,167,119],[120,166,118],[119,167,121],[168,166,120],[121,167,169],[170,168,120],[121,169,171],[122,170,120],[121,171,123],[124,170,122],[123,171,125],[172,170,124],[125,171,173],[174,172,124],[125,173,175],[126,174,124],[125,175,127],[128,174,126],[127,175,129],[176,174,128],[129,175,177],[178,176,128],[129,177,179],[130,178,128],[129,179,131],[132,178,130],[131,179,133],[180,178,132],[133,179,181],[182,180,132],[133,181,183],[134,182,132],[133,183,135],[140,182,134],[135,183,141],[184,182,140],[141,183,185],[186,184,140],[141,185,187],[142,186,140],[141,187,143],[146,186,142],[143,187,149],[188,186,146],[149,187,189],[190,188,146],[149,189,191],[150,190,146],[149,191,151],[192,190,150],[151,191,193],[194,192,150],[195,192,194],[195,151,193],[194,151,195],[153,194,150],[194,153,151],[196,190,192],[193,191,197],[198,196,192],[193,197,199],[200,198,192],[201,198,200],[201,193,199],[200,193,201],[195,200,192],[200,195,193],[202,157,203],[204,157,202],[204,205,159],[202,205,204],[160,203,157],[159,205,161],[204,156,157],[156,204,159],[206,203,160],[161,205,207],[208,206,160],[161,207,209],[162,208,160],[161,209,163],[164,208,162],[163,209,165],[210,208,164],[165,209,211],[212,210,164],[165,211,213],[166,212,164],[165,213,167],[168,212,166],[167,213,169],[214,212,168],[169,213,215],[216,214,168],[169,215,217],[170,216,168],[169,217,171],[172,216,170],[171,217,173],[218,216,172],[173,217,219],[220,218,172],[173,219,221],[174,220,172],[173,221,175],[176,220,174],[175,221,177],[222,220,176],[177,221,223],[224,222,176],[177,223,225],[178,224,176],[177,225,179],[180,224,178],[179,225,181],[226,224,180],[181,225,227],[228,226,180],[181,227,229],[182,228,180],[181,229,183],[184,228,182],[183,229,185],[230,228,184],[185,229,231],[232,230,184],[185,231,233],[186,232,184],[185,233,187],[188,232,186],[187,233,189],[234,232,188],[189,233,235],[236,234,188],[189,235,237],[190,236,188],[189,237,191],[196,236,190],[191,237,197],[238,236,196],[197,237,239],[240,238,196],[197,239,241],[198,240,196],[197,241,199],[242,240,198],[199,241,243],[244,242,198],[245,242,244],[245,199,243],[244,199,245],[201,244,198],[244,201,199],[246,240,242],[243,241,247],[248,246,242],[243,247,249],[250,248,242],[251,248,250],[251,243,249],[250,243,251],[245,250,242],[250,245,243],[252,248,253],[254,249,255],[256,252,253],[257,252,256],[257,254,255],[256,254,257],[258,256,253],[256,258,254],[259,258,253],[258,259,254],[260,259,253],[259,260,254],[251,253,248],[260,253,251],[260,249,254],[251,249,260],[261,203,262],[263,203,261],[263,264,205],[261,264,263],[206,262,203],[205,264,207],[263,202,203],[202,263,205],[265,262,206],[207,264,266],[267,265,206],[207,266,268],[208,267,206],[207,268,209],[210,267,208],[209,268,211],[269,267,210],[211,268,270],[271,269,210],[211,270,272],[212,271,210],[211,272,213],[214,271,212],[213,272,215],[273,271,214],[215,272,274],[275,273,214],[215,274,276],[216,275,214],[215,276,217],[218,275,216],[217,276,219],[277,275,218],[219,276,278],[279,277,218],[219,278,280],[220,279,218],[219,280,221],[222,279,220],[221,280,223],[281,279,222],[223,280,282],[283,281,222],[223,282,284],[224,283,222],[223,284,225],[226,283,224],[225,284,227],[285,283,226],[227,284,286],[287,285,226],[227,286,288],[228,287,226],[227,288,229],[230,287,228],[229,288,231],[289,287,230],[231,288,290],[291,289,230],[231,290,292],[232,291,230],[231,292,233],[234,291,232],[233,292,235],[293,291,234],[235,292,294],[295,293,234],[235,294,296],[236,295,234],[235,296,237],[238,295,236],[237,296,239],[297,295,238],[239,296,298],[299,297,238],[239,298,300],[240,299,238],[239,300,241],[246,299,240],[241,300,247],[301,299,246],[247,300,302],[303,301,246],[247,302,304],[248,303,246],[247,304,249],[252,303,248],[249,304,255],[305,303,252],[255,304,306],[307,305,252],[255,306,308],[257,307,252],[309,307,257],[309,255,308],[257,255,309],[310,262,311],[312,262,310],[312,313,264],[310,313,312],[265,311,262],[264,313,266],[312,261,262],[261,312,264],[314,311,265],[266,313,315],[316,314,265],[266,315,317],[267,316,265],[266,317,268],[269,316,267],[268,317,270],[318,316,269],[270,317,319],[320,318,269],[270,319,321],[271,320,269],[270,321,272],[273,320,271],[272,321,274],[322,320,273],[323,320,322],[323,274,321],[322,274,323],[324,273,325],[322,273,324],[322,326,274],[324,326,322],[275,325,273],[274,326,276],[277,325,275],[276,326,278],[327,325,277],[278,326,328],[329,327,277],[278,328,330],[279,329,277],[278,330,280],[281,329,279],[280,330,282],[331,329,281],[282,330,332],[333,331,281],[282,332,334],[283,333,281],[282,334,284],[285,333,283],[284,334,286],[335,333,285],[286,334,336],[337,335,285],[286,336,338],[287,337,285],[286,338,288],[289,337,287],[288,338,290],[339,337,289],[290,338,340],[341,339,289],[290,340,342],[291,341,289],[290,342,292],[293,341,291],[292,342,294],[343,341,293],[294,342,344],[345,343,293],[294,344,346],[295,345,293],[294,346,296],[297,345,295],[296,346,298],[347,345,297],[298,346,348],[349,347,297],[298,348,350],[299,349,297],[298,350,300],[301,349,299],[300,350,302],[351,349,301],[302,350,352],[353,351,301],[302,352,354],[303,353,301],[302,354,304],[305,353,303],[304,354,306],[355,353,305],[306,354,356],[357,355,305],[306,356,358],[307,357,305],[306,358,308],[359,357,307],[360,357,359],[360,308,358],[359,308,360],[361,359,307],[359,361,308],[309,361,307],[361,309,308],[362,311,363],[364,311,362],[364,365,313],[362,365,364],[314,363,311],[313,365,315],[364,310,311],[310,364,313],[366,363,314],[315,365,367],[368,366,314],[315,367,369],[316,368,314],[315,369,317],[318,368,316],[317,369,319],[370,368,318],[371,368,370],[371,319,369],[370,319,371],[372,370,318],[370,372,319],[373,318,320],[372,318,373],[372,321,319],[373,321,372],[323,373,320],[373,323,321],[374,324,325],[324,374,326],[375,325,327],[374,325,375],[374,328,326],[375,328,374],[376,375,327],[375,376,328],[377,376,327],[376,377,328],[378,327,329],[377,327,378],[377,330,328],[378,330,377],[379,329,331],[378,329,379],[378,332,330],[379,332,378],[380,379,331],[379,380,332],[381,331,382],[380,331,381],[380,383,332],[381,383,380],[333,382,331],[332,383,334],[335,382,333],[334,383,336],[384,382,335],[385,382,384],[385,336,383],[384,336,385],[386,335,387],[384,335,386],[384,388,336],[386,388,384],[337,387,335],[336,388,338],[339,387,337],[338,388,340],[389,387,339],[340,388,390],[391,389,339],[340,390,392],[341,391,339],[340,392,342],[343,391,341],[342,392,344],[393,391,343],[344,392,394],[395,393,343],[344,394,396],[345,395,343],[344,396,346],[347,395,345],[346,396,348],[397,395,347],[348,396,398],[399,397,347],[348,398,400],[349,399,347],[348,400,350],[351,399,349],[350,400,352],[401,399,351],[352,400,402],[403,401,351],[352,402,404],[353,403,351],[352,404,354],[355,403,353],[354,404,356],[405,403,355],[356,404,406],[407,405,355],[356,406,408],[357,407,355],[356,408,358],[409,407,357],[410,407,409],[410,358,408],[409,358,410],[360,409,357],[409,360,358],[411,363,412],[413,363,411],[413,414,365],[411,414,413],[366,412,363],[365,414,367],[413,362,363],[362,413,365],[415,412,366],[367,414,416],[417,415,366],[367,416,418],[368,417,366],[367,418,369],[371,417,368],[419,417,371],[419,369,418],[371,369,419],[420,381,382],[381,420,383],[385,420,382],[420,385,383],[421,386,387],[386,421,388],[422,387,389],[421,387,422],[421,390,388],[422,390,421],[423,422,389],[422,423,390],[424,389,425],[423,389,424],[423,426,390],[424,426,423],[391,425,389],[390,426,392],[393,425,391],[392,426,394],[427,425,393],[428,425,427],[428,394,426],[427,394,428],[429,393,430],[427,393,429],[427,431,394],[429,431,427],[395,430,393],[394,431,396],[397,430,395],[396,431,398],[432,430,397],[398,431,433],[434,432,397],[398,433,435],[399,434,397],[398,435,400],[401,434,399],[400,435,402],[436,434,401],[402,435,437],[438,436,401],[402,437,439],[403,438,401],[402,439,404],[405,438,403],[404,439,406],[440,438,405],[406,439,441],[442,440,405],[406,441,443],[407,442,405],[406,443,408],[444,442,407],[445,442,444],[445,408,443],[444,408,445],[410,444,407],[444,410,408],[446,447,412],[447,446,414],[448,412,415],[446,412,448],[446,416,414],[448,416,446],[447,411,412],[411,447,414],[449,448,415],[448,449,416],[450,449,415],[449,450,416],[451,415,417],[450,415,451],[450,418,416],[451,418,450],[452,451,417],[451,452,418],[419,452,417],[452,419,418],[453,424,425],[424,453,426],[428,453,425],[453,428,426],[454,429,430],[429,454,431],[455,430,432],[454,430,455],[454,433,431],[455,433,454],[456,455,432],[455,456,433],[457,432,458],[456,432,457],[456,459,433],[457,459,456],[434,458,432],[433,459,435],[436,458,434],[435,459,437],[460,458,436],[461,458,460],[461,437,459],[460,437,461],[462,436,463],[460,436,462],[460,464,437],[462,464,460],[438,463,436],[437,464,439],[440,463,438],[439,464,441],[465,463,440],[441,464,466],[467,465,440],[441,466,468],[442,467,440],[441,468,443],[469,467,442],[470,467,469],[470,443,468],[469,443,470],[445,469,442],[469,445,443],[471,457,458],[457,471,459],[461,471,458],[471,461,459],[472,462,463],[462,472,464],[473,463,465],[472,463,473],[472,466,464],[473,466,472],[474,473,465],[473,474,466],[475,474,465],[474,475,466],[476,465,467],[475,465,476],[475,468,466],[476,468,475],[477,476,467],[476,477,468],[470,477,467],[477,470,468]]);
}

translate(center_inflated_handlenset_2) inflated_handlenset_2();
